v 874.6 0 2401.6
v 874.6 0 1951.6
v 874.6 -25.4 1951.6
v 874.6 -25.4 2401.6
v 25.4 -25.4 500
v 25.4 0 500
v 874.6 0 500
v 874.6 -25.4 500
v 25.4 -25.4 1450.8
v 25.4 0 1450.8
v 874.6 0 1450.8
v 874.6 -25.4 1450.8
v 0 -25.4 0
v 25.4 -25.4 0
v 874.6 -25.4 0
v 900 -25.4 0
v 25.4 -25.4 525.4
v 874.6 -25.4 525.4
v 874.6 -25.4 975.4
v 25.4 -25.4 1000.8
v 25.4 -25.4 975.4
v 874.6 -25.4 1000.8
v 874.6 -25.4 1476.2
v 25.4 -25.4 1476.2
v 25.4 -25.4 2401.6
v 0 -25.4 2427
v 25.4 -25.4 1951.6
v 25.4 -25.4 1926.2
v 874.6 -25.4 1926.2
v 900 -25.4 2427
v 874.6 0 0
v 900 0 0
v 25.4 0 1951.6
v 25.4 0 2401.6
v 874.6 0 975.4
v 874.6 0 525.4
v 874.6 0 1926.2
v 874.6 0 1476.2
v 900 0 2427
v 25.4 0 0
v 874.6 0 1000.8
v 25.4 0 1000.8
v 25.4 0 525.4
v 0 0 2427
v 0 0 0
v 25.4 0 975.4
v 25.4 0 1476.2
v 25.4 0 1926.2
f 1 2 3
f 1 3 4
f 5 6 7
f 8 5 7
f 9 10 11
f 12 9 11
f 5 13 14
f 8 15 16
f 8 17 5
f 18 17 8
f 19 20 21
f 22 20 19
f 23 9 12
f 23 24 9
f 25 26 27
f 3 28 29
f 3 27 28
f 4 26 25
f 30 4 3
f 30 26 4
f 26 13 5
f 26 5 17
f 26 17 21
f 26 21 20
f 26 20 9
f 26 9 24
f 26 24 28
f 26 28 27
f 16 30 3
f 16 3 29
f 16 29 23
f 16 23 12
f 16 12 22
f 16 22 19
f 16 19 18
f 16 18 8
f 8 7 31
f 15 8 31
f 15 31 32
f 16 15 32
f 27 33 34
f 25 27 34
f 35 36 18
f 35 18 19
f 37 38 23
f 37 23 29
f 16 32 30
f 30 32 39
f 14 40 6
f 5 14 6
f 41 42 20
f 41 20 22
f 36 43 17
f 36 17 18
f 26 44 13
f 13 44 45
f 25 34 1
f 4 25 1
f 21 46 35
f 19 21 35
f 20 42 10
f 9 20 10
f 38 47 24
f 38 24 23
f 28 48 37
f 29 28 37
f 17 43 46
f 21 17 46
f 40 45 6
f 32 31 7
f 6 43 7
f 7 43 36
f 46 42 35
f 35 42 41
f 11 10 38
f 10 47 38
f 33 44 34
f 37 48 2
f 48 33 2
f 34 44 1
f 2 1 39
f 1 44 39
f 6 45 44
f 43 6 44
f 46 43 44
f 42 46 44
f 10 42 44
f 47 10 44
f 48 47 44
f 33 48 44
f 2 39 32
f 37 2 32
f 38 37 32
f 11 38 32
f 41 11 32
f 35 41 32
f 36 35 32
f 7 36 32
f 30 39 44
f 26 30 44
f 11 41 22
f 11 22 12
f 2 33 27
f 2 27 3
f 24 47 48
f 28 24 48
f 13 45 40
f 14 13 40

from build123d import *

# Parameters (mm, degrees)
F0_W     = 849.2
F0_H     = 450
F1_DEPTH = 25.4


with BuildPart() as f1:
    # F0 (on Front) → F1 (new body)
    with BuildSketch(Plane.XZ):
        Polygon((0, 2427), (0, 0), (25.4, 0), (25.4, 500), (874.6, 500), (874.6, 0), (900, 0), (900, 2427), align=None)
        with Locations((450, 750.4)):
            Rectangle(F0_W, F0_H, mode=Mode.SUBTRACT)
        with Locations((450, 1225.8)):
            Rectangle(F0_W, F0_H, mode=Mode.SUBTRACT)
        with Locations((450, 1701.2)):
            Rectangle(F0_W, F0_H, mode=Mode.SUBTRACT)
        with Locations((450, 2176.6)):
            Rectangle(F0_W, F0_H, mode=Mode.SUBTRACT)
    extrude(amount=F1_DEPTH)


solid = f1.part
